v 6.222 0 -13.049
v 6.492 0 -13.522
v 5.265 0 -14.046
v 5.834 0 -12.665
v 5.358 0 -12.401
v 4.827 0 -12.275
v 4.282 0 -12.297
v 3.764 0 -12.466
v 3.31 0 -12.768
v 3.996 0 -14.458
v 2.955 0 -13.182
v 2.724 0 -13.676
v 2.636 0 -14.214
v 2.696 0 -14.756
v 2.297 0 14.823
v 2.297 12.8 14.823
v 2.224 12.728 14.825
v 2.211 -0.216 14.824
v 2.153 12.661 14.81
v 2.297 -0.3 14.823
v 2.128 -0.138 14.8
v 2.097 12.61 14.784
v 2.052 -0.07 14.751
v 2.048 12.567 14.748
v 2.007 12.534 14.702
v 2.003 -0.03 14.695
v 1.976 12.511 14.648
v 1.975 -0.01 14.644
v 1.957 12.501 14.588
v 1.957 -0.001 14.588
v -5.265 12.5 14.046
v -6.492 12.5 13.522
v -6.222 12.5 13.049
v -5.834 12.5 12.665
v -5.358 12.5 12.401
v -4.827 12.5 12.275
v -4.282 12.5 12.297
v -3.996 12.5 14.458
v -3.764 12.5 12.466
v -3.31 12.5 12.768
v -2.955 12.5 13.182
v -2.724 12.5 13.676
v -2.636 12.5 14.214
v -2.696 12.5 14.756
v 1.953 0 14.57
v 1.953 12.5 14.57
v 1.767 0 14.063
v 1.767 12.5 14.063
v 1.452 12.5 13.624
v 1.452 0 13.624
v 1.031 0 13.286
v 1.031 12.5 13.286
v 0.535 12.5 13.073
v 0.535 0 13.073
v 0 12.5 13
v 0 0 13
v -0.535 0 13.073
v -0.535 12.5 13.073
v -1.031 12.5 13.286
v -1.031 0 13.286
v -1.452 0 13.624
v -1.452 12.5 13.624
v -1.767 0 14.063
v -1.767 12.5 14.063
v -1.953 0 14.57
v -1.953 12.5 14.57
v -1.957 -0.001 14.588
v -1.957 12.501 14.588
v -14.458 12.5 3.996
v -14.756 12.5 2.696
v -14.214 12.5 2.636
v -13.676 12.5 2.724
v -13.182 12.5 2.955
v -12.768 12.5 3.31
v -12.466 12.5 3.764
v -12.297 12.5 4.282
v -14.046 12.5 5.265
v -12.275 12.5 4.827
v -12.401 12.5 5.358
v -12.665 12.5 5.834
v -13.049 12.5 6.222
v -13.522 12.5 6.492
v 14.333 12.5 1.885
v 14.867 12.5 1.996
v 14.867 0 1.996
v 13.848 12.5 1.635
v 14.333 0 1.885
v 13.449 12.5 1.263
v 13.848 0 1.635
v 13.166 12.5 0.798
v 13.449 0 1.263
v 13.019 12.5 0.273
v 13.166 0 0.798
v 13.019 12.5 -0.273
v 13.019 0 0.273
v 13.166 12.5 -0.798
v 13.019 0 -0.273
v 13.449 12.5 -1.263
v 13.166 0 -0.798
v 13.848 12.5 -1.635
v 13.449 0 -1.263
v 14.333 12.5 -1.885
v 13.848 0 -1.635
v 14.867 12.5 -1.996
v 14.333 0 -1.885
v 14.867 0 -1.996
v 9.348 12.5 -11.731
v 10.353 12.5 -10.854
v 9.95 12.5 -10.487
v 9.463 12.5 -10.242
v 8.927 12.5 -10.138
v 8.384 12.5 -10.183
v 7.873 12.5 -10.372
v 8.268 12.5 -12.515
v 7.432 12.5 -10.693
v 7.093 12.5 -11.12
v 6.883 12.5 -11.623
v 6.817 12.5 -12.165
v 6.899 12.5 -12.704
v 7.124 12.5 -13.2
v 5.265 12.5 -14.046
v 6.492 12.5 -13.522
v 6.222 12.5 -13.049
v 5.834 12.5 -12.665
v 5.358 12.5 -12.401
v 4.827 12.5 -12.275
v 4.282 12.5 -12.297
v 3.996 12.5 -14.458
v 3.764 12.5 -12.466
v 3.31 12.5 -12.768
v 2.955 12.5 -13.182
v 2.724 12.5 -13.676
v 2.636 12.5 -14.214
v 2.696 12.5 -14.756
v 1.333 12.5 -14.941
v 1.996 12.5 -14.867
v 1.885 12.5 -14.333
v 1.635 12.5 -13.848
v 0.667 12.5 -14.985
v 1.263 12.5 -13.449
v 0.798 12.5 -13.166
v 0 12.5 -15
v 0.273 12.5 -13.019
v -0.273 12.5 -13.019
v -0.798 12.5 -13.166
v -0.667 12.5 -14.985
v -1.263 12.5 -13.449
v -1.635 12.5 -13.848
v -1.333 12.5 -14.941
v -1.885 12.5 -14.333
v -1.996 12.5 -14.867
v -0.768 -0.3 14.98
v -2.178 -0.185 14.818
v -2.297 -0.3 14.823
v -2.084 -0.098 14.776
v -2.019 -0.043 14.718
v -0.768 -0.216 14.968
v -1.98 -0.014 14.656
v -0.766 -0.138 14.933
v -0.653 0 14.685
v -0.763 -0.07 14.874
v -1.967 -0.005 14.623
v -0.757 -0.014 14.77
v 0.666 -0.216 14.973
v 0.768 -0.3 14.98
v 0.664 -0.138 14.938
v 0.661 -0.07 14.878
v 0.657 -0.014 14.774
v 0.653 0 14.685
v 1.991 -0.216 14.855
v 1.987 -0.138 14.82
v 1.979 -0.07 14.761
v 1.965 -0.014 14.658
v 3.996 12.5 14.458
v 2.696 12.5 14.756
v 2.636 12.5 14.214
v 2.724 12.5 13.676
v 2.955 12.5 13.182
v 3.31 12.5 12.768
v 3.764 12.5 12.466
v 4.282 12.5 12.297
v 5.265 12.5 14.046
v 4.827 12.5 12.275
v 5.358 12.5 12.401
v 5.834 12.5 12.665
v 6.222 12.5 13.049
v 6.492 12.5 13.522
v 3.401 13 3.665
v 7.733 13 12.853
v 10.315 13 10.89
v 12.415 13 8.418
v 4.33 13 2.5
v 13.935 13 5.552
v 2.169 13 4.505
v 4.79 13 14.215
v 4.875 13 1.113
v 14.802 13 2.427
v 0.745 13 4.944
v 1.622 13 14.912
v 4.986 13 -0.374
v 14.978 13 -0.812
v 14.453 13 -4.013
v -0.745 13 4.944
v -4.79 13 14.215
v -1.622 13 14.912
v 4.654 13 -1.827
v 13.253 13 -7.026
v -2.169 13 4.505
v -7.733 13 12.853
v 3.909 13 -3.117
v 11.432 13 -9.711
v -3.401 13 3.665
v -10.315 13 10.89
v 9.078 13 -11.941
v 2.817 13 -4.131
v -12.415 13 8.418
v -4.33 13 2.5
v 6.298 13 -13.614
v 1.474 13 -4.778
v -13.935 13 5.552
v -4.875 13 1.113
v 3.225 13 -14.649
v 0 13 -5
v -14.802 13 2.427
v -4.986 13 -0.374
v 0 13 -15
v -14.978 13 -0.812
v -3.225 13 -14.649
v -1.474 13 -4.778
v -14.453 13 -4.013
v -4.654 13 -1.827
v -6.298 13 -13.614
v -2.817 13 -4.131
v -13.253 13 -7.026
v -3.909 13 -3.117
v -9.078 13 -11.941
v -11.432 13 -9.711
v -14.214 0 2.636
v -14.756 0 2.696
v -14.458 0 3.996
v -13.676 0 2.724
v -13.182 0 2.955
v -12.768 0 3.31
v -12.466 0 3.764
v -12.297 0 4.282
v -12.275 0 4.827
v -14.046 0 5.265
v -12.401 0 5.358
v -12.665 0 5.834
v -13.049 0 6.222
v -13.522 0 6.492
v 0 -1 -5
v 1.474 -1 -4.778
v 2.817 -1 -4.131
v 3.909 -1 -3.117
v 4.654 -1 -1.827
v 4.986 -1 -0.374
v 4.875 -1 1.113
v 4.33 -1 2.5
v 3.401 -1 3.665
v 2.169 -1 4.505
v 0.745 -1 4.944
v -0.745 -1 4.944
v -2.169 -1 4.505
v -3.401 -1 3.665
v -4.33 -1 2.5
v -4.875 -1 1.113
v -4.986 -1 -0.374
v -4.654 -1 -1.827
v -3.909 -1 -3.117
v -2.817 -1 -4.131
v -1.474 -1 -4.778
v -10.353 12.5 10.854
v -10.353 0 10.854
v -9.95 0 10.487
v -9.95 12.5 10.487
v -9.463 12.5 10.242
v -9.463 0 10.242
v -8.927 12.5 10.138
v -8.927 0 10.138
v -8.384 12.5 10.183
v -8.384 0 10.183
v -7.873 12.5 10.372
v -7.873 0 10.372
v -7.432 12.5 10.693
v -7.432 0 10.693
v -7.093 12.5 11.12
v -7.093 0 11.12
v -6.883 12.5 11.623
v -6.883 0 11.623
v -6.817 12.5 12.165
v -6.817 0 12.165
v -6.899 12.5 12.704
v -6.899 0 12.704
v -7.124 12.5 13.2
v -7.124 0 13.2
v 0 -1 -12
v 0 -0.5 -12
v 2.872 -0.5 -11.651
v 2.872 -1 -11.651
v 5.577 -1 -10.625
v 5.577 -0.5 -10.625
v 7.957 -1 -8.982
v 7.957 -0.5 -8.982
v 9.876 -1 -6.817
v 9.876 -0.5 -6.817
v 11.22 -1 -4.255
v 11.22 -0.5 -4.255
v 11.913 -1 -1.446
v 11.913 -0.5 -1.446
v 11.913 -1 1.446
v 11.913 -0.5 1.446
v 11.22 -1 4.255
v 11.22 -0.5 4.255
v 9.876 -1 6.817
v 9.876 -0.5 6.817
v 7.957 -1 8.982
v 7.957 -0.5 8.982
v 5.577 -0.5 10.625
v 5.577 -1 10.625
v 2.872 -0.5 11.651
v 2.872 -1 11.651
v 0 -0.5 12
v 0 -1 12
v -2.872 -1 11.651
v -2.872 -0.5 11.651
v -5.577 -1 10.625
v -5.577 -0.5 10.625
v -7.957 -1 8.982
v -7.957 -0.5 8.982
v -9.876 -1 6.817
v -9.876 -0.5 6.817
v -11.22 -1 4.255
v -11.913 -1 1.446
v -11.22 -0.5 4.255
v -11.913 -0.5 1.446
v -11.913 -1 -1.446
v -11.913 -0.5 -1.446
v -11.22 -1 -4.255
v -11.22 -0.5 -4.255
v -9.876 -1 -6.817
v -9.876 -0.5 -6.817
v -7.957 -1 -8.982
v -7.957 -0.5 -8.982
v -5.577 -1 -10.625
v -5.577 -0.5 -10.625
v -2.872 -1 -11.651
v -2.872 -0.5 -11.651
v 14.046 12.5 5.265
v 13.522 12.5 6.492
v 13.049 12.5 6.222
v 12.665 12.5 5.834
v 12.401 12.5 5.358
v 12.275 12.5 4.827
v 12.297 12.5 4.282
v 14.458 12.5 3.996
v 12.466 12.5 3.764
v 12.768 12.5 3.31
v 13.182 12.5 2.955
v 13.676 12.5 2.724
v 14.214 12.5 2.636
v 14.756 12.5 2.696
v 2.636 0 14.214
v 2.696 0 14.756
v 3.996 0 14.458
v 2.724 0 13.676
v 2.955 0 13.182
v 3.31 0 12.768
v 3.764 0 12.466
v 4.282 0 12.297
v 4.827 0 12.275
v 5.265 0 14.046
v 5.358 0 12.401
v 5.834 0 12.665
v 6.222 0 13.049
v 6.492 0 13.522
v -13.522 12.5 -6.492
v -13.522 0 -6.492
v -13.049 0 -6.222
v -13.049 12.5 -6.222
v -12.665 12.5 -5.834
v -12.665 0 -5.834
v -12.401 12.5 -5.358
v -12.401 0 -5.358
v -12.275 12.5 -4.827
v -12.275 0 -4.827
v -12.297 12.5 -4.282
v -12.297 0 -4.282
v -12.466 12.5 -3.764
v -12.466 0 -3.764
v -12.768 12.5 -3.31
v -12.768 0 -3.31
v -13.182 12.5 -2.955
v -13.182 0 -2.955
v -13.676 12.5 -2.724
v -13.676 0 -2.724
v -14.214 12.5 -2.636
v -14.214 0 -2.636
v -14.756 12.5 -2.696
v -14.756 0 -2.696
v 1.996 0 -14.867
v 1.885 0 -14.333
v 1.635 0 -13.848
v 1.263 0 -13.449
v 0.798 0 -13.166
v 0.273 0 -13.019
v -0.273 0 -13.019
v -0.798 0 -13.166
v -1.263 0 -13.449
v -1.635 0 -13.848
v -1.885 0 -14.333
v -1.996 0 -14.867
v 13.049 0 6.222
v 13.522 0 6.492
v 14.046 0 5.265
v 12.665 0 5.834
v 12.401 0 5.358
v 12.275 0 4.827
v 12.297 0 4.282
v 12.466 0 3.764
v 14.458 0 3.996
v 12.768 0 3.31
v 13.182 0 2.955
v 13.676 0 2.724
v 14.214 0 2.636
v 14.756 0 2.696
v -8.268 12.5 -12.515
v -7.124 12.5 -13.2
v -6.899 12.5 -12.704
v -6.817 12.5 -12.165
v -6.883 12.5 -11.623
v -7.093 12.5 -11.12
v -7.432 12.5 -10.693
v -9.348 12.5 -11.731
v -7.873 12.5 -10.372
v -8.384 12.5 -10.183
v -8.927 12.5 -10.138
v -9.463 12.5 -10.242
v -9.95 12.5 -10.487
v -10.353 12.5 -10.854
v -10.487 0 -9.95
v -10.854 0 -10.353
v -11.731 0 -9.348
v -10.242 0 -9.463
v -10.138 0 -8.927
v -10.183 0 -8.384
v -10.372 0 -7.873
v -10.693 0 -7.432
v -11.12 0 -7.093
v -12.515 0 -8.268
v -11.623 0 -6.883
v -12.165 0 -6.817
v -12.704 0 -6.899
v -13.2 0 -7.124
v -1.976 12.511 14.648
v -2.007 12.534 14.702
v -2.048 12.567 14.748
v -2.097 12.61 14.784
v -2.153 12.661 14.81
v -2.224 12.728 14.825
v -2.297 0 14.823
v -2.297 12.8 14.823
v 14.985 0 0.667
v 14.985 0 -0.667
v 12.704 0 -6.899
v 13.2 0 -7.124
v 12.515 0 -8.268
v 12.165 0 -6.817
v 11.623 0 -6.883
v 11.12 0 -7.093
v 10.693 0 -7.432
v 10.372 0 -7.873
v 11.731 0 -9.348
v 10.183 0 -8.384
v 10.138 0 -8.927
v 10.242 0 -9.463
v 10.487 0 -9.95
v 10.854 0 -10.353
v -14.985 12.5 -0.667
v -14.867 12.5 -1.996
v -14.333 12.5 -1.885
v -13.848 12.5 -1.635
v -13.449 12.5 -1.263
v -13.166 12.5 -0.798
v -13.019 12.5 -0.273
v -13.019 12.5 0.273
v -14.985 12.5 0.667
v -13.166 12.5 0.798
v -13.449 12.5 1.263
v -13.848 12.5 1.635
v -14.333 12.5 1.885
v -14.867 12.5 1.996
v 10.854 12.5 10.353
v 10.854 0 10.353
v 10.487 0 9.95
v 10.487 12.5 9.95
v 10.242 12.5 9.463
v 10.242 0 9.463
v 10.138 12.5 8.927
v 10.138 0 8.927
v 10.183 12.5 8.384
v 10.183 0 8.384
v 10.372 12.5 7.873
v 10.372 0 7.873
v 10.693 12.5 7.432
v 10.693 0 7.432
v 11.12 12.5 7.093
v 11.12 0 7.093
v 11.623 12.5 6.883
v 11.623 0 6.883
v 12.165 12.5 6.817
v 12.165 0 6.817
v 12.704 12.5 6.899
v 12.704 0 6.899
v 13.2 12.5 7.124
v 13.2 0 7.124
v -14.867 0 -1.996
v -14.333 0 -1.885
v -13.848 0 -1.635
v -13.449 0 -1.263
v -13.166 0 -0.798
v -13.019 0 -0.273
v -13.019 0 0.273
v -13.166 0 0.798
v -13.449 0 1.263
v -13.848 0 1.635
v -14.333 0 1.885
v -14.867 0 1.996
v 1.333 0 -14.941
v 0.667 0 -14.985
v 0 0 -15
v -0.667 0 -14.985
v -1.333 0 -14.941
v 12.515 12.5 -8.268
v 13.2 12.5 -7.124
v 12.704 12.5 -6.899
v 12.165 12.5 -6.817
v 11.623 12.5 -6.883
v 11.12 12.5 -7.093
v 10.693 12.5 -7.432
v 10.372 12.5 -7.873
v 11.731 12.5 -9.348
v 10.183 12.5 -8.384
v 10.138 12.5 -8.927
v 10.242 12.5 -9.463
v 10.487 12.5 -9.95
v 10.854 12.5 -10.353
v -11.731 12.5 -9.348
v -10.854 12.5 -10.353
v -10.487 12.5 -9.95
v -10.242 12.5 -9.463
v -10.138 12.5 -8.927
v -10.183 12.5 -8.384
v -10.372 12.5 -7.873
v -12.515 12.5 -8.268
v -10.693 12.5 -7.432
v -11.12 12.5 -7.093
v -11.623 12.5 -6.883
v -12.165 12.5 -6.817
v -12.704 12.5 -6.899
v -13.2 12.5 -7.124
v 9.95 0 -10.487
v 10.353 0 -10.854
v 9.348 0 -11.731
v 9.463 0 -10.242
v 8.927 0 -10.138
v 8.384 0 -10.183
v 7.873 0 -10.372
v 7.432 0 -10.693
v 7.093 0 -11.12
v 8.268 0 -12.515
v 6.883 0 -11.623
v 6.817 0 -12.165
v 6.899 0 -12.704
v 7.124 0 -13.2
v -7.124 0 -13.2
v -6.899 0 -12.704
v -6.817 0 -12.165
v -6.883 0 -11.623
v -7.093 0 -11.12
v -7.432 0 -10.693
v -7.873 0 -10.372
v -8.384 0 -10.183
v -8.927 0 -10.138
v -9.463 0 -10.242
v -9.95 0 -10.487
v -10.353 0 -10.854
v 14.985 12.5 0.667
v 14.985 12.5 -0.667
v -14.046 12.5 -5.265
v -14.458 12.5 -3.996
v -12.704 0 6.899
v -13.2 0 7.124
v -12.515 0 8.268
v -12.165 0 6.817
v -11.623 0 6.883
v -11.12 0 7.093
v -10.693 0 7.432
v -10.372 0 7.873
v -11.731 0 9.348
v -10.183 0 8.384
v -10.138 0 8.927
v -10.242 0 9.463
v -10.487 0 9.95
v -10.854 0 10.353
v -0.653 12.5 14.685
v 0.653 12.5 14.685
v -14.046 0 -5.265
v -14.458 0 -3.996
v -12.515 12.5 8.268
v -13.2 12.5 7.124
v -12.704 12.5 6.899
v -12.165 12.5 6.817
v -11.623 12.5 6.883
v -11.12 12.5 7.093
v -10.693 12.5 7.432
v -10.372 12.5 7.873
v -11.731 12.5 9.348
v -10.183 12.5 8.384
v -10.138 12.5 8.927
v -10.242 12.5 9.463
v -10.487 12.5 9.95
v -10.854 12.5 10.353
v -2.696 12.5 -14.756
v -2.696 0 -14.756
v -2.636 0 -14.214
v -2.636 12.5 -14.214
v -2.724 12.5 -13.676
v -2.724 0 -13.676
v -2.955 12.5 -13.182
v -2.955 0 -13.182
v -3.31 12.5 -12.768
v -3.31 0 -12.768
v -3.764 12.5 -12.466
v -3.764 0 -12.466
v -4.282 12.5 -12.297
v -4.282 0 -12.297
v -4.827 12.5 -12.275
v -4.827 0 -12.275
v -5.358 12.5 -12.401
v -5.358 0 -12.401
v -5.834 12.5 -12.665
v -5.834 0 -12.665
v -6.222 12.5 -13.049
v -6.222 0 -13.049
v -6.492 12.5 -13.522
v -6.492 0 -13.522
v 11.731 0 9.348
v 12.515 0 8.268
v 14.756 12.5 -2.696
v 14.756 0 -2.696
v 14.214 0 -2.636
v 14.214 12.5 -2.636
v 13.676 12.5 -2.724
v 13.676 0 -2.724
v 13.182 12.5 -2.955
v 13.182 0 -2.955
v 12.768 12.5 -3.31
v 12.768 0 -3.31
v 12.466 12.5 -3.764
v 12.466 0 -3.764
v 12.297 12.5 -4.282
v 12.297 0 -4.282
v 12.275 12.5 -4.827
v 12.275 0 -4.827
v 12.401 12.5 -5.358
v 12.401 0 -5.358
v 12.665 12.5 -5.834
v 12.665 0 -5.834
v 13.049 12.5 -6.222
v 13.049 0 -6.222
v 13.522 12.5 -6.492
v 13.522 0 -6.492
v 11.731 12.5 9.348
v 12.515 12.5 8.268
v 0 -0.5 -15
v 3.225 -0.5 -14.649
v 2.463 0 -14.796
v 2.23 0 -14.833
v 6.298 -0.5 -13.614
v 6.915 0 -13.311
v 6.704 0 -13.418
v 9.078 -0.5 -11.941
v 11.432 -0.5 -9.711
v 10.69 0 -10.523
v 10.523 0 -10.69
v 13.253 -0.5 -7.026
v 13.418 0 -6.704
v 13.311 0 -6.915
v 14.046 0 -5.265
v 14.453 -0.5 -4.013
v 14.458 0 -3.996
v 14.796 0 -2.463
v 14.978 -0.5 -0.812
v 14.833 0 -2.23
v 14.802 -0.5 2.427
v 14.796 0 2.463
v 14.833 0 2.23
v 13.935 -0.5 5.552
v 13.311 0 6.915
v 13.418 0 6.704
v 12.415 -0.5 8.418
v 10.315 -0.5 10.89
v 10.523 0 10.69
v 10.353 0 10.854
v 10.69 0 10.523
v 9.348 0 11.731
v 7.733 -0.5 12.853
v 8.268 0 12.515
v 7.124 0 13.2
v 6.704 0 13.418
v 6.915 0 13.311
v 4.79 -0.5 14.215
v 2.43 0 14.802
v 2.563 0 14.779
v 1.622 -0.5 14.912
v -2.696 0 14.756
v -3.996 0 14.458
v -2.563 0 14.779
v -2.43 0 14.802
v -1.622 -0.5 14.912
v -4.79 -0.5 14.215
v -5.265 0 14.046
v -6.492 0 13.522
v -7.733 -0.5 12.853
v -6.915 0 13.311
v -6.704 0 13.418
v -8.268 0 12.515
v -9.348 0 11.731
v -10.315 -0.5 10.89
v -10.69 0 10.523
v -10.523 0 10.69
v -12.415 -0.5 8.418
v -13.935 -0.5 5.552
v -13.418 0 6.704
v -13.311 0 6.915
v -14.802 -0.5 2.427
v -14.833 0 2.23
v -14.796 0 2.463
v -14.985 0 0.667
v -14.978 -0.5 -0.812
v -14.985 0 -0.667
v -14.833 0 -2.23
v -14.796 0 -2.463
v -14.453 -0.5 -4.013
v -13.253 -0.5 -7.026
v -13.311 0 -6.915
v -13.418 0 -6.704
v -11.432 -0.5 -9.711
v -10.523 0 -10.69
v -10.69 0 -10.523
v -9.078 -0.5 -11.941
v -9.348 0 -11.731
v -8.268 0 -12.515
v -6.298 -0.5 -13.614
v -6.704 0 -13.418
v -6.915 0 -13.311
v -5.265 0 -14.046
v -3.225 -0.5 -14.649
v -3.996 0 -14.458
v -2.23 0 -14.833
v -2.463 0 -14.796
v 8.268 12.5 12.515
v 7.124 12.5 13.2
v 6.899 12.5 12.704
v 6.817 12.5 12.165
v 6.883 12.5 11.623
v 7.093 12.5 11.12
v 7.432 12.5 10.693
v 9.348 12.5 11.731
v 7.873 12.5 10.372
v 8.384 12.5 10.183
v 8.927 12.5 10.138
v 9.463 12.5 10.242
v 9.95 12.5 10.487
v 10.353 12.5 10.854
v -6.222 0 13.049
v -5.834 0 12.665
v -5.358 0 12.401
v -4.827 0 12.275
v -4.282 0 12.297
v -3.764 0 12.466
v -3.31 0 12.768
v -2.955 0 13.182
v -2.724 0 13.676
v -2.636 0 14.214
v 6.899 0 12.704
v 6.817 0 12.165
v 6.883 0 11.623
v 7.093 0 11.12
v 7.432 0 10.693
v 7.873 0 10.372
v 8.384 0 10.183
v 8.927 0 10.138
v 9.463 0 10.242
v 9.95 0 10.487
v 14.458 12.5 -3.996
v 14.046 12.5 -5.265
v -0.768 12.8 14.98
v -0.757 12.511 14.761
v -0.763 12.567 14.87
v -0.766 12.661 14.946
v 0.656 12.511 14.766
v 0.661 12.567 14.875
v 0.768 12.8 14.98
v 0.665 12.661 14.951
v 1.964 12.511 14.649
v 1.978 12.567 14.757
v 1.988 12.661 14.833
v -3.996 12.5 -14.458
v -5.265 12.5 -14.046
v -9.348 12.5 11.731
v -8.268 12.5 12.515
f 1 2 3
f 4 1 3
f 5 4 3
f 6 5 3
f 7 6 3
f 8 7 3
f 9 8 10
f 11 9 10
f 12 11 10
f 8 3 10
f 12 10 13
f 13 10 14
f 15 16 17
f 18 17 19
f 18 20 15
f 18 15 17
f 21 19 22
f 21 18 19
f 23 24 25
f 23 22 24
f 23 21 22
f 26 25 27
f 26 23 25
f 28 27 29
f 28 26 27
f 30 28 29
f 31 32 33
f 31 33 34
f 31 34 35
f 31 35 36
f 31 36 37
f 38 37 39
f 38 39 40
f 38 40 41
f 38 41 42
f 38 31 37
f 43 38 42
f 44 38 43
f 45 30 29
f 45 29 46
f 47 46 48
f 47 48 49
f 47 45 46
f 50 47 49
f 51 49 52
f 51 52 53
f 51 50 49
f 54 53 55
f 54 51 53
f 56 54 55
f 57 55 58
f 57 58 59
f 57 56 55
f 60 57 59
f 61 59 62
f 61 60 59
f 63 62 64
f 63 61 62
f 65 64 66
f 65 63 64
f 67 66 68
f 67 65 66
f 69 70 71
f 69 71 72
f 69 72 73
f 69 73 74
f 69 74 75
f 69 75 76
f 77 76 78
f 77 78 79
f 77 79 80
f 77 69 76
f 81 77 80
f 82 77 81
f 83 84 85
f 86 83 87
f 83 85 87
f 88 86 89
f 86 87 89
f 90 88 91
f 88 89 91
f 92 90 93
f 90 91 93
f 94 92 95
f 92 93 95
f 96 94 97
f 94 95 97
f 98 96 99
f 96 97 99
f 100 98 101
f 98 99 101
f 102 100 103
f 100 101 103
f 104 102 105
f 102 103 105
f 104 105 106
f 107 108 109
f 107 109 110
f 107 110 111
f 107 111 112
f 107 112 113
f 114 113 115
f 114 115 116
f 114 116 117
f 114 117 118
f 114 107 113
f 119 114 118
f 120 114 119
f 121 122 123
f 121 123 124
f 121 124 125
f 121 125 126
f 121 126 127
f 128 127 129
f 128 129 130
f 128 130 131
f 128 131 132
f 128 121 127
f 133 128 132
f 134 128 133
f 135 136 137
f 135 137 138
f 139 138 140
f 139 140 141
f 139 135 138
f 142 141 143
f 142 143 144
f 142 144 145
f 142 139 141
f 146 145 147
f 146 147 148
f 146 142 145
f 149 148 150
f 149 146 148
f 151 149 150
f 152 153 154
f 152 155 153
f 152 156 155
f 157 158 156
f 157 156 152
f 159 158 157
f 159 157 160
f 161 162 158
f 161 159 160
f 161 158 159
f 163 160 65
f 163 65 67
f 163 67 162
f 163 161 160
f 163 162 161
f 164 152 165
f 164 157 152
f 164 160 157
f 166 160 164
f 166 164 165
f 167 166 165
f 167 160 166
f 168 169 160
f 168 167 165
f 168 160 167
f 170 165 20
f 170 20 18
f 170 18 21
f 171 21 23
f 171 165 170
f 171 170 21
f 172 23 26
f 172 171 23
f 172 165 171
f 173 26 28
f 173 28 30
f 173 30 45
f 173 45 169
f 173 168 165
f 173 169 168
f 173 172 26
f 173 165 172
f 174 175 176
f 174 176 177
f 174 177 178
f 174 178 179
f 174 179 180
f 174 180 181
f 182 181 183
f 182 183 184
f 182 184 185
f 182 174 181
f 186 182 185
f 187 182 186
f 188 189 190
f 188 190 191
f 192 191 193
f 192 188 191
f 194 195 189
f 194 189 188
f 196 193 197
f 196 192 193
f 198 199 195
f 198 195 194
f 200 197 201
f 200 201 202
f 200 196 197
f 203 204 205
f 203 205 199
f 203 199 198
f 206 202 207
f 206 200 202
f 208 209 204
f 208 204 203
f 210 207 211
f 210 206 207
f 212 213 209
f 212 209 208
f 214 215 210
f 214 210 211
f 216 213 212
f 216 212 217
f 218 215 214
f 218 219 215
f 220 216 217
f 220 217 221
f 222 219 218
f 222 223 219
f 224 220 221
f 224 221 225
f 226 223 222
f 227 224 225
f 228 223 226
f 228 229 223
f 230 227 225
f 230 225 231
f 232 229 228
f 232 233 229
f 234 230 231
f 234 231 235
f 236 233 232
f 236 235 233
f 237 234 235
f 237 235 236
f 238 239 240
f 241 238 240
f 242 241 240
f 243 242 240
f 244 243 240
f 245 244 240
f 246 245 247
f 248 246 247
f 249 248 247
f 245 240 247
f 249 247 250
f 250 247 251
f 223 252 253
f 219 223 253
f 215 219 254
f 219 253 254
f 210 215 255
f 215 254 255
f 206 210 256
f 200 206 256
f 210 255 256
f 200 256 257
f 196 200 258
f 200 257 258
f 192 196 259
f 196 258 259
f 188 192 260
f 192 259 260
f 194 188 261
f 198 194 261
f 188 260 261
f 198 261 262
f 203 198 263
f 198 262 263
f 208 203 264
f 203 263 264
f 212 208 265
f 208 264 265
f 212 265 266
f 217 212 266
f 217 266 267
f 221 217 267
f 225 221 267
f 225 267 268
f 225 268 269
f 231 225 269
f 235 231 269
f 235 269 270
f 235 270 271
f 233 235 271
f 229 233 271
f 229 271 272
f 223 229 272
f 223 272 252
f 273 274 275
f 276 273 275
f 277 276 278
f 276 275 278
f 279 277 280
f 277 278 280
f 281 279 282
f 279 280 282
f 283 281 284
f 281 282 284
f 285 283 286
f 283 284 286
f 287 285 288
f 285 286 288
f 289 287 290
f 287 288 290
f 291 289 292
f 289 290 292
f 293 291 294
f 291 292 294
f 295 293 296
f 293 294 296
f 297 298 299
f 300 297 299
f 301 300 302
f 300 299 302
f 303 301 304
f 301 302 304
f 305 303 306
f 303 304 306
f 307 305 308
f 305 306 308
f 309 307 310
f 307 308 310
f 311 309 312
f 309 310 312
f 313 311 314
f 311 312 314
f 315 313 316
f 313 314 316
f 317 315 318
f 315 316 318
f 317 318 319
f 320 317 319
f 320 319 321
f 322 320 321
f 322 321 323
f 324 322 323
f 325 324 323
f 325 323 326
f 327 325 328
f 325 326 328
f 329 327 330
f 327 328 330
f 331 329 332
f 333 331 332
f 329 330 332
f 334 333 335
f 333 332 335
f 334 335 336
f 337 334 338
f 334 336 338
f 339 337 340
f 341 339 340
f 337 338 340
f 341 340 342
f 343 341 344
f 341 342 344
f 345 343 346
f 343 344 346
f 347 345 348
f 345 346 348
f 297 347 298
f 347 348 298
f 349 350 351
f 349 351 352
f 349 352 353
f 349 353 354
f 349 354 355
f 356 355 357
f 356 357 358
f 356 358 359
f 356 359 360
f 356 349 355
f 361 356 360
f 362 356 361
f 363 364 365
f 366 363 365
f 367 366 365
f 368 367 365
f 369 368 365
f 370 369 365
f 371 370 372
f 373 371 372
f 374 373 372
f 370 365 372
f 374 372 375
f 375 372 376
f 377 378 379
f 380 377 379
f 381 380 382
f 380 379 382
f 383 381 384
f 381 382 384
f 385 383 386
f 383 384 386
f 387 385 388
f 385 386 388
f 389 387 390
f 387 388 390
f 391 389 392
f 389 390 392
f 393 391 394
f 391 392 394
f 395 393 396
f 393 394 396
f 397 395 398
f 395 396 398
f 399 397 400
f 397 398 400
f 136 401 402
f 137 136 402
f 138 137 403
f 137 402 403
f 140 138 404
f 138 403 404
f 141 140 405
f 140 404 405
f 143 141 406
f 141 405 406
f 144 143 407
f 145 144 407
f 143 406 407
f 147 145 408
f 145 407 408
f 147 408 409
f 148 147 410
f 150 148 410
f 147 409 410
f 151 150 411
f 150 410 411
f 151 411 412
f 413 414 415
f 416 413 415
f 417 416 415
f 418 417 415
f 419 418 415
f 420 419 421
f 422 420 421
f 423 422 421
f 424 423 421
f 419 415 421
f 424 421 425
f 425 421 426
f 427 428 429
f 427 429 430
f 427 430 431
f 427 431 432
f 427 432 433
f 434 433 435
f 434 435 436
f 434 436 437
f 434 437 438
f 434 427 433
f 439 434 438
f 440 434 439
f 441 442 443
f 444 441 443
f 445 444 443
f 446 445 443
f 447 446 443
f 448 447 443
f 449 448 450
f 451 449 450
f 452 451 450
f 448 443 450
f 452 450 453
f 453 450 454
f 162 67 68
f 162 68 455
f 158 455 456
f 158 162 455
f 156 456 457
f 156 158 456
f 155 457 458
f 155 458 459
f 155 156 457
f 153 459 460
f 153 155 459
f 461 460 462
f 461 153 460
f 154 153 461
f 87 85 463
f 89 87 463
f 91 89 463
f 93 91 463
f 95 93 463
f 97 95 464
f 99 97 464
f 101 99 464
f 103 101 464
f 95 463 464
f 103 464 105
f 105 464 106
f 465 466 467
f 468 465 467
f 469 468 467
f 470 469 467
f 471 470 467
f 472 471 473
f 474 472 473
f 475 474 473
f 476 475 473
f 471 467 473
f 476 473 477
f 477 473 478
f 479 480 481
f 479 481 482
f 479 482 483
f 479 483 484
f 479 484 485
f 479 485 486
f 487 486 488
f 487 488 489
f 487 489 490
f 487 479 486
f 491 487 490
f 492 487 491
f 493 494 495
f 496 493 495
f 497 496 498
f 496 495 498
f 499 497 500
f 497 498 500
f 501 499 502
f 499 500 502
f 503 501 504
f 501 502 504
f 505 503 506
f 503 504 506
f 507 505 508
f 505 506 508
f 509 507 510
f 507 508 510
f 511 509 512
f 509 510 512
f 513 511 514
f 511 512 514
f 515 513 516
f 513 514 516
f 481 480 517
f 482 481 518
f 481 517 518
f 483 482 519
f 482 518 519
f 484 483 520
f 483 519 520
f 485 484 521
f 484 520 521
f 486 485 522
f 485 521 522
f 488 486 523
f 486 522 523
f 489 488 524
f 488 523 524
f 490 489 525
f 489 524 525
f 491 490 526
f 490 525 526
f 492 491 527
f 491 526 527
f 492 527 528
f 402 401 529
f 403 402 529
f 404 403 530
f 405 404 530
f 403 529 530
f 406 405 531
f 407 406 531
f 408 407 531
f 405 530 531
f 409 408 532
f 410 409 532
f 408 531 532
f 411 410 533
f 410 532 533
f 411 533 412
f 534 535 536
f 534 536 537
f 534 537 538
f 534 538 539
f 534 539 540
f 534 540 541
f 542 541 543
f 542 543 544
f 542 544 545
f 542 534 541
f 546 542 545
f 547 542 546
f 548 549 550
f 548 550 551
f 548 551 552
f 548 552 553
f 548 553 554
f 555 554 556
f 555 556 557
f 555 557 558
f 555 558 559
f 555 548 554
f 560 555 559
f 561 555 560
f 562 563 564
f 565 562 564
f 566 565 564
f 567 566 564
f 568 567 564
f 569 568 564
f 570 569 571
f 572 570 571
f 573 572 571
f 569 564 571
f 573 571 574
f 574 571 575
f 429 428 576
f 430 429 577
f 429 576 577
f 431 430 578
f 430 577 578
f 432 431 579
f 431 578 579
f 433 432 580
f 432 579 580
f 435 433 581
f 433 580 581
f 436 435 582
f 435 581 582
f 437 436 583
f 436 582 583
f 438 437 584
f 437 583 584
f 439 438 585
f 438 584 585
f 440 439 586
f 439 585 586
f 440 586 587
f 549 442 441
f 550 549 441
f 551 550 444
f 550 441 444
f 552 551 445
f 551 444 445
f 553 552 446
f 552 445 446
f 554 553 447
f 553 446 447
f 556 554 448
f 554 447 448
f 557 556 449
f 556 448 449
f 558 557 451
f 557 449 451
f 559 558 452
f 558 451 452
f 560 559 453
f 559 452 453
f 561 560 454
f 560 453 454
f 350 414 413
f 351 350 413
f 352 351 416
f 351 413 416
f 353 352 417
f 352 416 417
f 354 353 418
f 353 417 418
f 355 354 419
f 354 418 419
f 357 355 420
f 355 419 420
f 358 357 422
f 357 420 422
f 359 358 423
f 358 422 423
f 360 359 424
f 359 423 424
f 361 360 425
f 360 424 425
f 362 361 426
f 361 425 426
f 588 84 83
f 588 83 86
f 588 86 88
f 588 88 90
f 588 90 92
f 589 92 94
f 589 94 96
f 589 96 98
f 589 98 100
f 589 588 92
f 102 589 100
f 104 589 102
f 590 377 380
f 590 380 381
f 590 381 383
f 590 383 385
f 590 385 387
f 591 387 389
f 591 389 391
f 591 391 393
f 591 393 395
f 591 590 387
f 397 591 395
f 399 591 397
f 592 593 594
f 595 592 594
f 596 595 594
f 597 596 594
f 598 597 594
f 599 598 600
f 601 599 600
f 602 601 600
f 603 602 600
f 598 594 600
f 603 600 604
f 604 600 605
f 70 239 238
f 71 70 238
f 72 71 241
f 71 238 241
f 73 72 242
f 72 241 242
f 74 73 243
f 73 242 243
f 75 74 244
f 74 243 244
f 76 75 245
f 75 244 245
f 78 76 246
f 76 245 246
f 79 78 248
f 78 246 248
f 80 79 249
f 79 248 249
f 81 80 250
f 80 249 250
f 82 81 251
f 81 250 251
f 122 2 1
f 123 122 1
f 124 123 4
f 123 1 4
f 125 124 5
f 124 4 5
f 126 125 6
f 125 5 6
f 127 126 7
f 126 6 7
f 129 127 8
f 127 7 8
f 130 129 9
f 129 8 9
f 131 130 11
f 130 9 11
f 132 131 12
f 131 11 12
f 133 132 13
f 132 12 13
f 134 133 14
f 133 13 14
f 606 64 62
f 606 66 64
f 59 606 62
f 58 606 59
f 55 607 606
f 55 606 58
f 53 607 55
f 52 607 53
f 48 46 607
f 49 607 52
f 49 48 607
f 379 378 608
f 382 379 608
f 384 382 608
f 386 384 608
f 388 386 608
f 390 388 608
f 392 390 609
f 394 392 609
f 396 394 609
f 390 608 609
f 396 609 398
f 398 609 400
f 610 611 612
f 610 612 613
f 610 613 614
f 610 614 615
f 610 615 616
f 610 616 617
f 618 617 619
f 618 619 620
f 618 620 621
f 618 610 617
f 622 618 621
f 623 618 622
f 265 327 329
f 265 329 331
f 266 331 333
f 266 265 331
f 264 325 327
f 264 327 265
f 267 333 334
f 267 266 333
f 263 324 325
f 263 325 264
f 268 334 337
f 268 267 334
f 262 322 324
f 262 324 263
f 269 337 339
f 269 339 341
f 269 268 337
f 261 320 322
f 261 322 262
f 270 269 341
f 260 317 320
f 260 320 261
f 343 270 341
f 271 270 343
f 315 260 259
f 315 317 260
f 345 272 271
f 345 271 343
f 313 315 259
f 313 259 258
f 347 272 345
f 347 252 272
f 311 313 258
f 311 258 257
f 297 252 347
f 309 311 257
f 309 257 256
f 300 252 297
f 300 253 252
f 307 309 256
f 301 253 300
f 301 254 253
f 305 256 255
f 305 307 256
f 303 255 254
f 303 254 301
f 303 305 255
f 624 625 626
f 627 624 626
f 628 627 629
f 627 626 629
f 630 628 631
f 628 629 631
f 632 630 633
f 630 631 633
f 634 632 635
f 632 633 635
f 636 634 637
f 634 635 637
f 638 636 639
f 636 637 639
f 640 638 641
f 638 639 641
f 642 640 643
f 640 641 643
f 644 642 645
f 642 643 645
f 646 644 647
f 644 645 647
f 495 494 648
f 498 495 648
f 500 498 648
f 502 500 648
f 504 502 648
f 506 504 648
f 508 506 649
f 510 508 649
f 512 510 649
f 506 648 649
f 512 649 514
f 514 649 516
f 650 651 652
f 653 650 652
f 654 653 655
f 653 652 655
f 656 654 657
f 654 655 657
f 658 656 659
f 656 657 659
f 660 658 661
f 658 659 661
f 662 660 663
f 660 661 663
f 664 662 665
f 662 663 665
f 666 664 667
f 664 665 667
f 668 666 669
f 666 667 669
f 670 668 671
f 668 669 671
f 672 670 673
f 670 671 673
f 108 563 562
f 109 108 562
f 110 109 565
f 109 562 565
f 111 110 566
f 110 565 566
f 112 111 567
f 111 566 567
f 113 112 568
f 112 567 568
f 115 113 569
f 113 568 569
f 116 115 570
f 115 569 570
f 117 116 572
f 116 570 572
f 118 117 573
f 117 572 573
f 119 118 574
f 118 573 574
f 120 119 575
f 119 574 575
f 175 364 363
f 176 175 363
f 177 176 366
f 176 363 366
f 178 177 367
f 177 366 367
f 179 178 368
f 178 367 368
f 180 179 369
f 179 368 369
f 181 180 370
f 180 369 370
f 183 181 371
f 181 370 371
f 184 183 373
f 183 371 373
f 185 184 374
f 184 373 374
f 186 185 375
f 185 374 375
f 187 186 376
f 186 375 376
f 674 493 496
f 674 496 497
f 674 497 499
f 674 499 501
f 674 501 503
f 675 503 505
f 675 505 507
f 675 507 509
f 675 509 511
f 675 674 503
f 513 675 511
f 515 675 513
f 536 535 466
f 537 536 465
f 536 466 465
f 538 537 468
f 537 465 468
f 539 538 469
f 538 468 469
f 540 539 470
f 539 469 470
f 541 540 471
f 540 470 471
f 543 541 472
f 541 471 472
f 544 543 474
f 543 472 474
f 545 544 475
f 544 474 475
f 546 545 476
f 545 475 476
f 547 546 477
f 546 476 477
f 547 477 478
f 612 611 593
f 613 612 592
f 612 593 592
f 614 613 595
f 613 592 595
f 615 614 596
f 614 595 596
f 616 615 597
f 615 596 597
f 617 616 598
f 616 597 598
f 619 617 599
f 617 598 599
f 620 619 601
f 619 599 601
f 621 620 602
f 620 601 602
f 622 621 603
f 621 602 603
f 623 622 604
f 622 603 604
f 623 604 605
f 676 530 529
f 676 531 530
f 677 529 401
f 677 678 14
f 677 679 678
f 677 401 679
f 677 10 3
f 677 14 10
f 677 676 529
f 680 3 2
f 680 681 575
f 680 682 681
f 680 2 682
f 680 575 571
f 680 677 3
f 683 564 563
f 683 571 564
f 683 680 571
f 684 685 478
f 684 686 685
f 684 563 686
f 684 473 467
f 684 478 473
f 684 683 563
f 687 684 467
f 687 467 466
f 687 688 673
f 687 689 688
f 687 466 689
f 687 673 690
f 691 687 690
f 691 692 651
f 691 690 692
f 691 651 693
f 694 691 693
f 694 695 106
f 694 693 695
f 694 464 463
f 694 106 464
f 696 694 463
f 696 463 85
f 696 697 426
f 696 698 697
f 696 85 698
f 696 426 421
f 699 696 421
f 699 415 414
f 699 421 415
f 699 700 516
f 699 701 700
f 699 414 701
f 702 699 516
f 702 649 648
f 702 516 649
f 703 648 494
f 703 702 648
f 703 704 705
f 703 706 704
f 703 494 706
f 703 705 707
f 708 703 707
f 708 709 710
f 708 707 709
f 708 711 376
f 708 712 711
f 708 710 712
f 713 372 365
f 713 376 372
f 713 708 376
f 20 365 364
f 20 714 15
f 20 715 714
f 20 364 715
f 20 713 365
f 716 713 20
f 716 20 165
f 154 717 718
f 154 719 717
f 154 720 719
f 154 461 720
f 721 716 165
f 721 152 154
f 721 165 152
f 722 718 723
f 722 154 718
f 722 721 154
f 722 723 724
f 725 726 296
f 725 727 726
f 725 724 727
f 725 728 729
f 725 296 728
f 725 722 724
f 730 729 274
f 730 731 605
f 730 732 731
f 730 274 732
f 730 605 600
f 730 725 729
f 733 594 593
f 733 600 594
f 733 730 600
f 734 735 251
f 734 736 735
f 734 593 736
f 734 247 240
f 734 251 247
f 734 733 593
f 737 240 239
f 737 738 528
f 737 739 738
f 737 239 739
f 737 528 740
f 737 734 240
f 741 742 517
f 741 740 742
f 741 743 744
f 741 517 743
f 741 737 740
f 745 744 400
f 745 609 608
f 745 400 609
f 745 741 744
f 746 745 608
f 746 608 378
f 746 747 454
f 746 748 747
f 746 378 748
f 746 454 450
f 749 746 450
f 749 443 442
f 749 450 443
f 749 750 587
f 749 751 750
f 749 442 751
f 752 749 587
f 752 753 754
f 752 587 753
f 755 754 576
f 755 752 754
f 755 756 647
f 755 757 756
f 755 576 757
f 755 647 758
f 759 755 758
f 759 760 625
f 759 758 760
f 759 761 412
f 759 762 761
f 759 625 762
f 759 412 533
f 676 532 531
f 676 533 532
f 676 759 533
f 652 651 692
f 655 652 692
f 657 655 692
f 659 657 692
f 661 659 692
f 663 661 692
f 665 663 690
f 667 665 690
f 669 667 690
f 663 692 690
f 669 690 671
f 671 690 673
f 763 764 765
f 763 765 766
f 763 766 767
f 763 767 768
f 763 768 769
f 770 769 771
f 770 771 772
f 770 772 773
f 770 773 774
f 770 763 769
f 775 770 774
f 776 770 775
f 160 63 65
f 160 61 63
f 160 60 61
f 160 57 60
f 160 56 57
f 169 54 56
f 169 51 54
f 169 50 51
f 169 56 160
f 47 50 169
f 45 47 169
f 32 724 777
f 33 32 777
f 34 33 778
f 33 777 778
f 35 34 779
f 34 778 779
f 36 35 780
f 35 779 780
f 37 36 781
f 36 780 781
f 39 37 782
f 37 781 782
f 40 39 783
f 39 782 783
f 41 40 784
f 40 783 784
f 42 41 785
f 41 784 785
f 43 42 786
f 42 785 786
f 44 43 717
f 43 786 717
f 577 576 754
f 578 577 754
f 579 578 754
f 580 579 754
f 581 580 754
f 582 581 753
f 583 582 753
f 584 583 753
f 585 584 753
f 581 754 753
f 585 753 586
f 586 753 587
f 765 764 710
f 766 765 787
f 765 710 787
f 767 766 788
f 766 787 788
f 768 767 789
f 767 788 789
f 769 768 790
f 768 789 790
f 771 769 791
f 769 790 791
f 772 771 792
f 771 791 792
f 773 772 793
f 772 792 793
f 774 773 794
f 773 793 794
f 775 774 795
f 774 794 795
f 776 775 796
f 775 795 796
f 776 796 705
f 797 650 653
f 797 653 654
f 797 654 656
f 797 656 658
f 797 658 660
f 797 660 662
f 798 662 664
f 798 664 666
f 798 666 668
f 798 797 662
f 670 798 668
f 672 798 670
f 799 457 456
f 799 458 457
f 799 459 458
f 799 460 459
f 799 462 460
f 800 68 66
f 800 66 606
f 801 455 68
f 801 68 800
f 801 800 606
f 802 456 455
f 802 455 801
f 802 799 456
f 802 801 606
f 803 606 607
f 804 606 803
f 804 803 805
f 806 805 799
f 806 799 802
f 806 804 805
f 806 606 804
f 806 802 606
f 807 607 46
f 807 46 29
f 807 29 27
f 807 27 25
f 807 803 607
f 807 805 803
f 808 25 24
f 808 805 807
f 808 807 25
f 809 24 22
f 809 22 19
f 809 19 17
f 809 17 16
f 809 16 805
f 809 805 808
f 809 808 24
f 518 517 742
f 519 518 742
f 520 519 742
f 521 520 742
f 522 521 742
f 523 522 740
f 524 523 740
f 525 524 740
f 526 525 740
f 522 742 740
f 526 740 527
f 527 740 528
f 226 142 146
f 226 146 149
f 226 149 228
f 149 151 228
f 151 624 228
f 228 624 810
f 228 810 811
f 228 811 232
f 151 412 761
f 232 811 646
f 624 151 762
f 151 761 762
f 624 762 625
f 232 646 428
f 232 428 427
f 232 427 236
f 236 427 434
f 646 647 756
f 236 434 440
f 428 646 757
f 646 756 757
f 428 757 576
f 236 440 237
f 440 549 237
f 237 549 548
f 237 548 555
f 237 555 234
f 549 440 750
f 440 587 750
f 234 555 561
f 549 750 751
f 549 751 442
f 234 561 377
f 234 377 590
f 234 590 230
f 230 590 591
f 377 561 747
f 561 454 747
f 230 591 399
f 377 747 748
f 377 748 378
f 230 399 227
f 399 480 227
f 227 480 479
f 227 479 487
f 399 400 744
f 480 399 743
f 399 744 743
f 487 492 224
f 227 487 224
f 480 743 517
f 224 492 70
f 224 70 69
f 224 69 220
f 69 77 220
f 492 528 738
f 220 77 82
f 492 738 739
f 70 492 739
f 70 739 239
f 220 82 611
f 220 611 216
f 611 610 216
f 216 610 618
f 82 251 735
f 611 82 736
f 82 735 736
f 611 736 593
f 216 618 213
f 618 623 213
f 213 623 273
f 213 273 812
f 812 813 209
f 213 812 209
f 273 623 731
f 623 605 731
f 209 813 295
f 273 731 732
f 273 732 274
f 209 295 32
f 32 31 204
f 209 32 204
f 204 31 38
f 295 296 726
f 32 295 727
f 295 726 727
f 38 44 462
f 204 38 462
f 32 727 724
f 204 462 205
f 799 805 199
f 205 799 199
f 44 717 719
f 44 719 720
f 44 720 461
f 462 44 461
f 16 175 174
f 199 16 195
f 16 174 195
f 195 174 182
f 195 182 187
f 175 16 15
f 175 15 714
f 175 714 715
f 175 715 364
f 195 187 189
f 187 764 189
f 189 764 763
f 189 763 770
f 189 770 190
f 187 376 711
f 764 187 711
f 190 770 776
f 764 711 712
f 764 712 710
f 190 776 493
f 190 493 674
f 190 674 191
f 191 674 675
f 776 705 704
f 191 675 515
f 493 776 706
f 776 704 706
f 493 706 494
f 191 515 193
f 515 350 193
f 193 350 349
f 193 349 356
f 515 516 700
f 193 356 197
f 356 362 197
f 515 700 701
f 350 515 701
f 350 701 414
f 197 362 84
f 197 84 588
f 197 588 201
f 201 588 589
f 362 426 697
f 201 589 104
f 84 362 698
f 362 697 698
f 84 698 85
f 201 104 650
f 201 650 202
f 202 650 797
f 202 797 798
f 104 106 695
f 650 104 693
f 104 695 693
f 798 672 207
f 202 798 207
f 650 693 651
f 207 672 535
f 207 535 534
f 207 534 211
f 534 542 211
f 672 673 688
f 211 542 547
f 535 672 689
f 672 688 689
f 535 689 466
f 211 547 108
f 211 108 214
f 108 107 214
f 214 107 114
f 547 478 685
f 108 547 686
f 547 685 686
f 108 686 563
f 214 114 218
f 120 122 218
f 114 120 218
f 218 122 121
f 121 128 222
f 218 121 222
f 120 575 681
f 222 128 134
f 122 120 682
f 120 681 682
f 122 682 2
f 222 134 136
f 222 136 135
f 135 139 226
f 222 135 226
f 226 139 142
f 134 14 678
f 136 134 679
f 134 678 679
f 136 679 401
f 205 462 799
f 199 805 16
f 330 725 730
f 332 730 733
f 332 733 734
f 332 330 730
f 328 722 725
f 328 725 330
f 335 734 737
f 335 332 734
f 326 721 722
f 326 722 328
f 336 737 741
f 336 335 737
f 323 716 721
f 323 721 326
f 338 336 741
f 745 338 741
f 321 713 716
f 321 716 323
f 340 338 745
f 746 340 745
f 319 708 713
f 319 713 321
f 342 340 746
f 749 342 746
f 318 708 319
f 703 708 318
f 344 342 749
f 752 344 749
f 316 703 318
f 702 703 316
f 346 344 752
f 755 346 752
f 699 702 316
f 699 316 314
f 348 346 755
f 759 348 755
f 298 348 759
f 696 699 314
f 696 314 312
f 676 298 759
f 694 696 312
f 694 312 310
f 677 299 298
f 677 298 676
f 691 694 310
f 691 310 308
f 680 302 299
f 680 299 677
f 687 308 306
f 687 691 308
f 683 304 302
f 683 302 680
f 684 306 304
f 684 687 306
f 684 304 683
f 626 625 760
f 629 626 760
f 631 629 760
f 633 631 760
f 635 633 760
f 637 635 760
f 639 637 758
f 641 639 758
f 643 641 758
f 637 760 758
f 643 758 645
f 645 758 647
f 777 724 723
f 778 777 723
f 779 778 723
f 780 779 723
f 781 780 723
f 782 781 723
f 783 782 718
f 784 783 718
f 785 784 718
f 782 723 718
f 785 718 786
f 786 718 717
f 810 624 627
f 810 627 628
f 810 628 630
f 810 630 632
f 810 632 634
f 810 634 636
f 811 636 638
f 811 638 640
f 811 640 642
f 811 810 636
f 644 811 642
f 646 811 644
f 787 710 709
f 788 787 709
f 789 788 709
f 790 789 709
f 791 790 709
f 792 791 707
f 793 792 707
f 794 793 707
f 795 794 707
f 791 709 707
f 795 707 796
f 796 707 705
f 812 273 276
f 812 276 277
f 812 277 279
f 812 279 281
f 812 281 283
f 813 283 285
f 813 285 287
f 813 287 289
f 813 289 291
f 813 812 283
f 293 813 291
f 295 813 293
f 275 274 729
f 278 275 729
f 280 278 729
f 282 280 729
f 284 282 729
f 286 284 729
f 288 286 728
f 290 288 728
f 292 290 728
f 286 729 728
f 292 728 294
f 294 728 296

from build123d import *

# Parameters (mm, degrees)
SKETCH_2_R               = 15
EXTRUDE_1_DEPTH          = 13
SKETCH_8_R               = 2
CUT_EXTRUDE_10_DEPTH     = 12.5
EXTRUDE_START            = 0.5
SKETCH_10_R              = 15
EXTRUDE_4_DEPTH          = 0.5
SKETCH_11_R              = 12
EXTRUDE_5_DEPTH          = 0.5
SKETCH_12_R              = 5
CUT_EXTRUDE_12_DEPTH     = 26.416530054
FILLET_START             = -0.3000001
FILLET_2_DEPTH           = 13.1000002
FILLET_2_2_ANGLE         = 17.614798
PATTERN_CIRCULAR_1_COUNT = 20


with BuildPart() as part:
    # 草图2 → 凸台-拉伸1 (new body)
    with BuildSketch(Plane(origin=(0, 0, 0), x_dir=(1, 0, 0), z_dir=(0, 1, 0))):
        with Locations(Location((0, 0, 0), (0, 0, 90))):
            Circle(SKETCH_2_R)
    extrude(amount=EXTRUDE_1_DEPTH)

    # 草图8 → 切除-拉伸10 (cut)
    with BuildSketch(Plane.XZ):
        with Locations((0, 15)):
            Circle(SKETCH_8_R)
    cut_extrude_10 = extrude(amount=-CUT_EXTRUDE_10_DEPTH, mode=Mode.SUBTRACT)

    # 草图10 → 凸台-拉伸4 (add)
    with BuildSketch(Plane.XZ.offset(EXTRUDE_START)):
        with Locations(Location((0, 0, 0), (0, 0, 270))):
            Circle(SKETCH_10_R)
    extrude(amount=-EXTRUDE_4_DEPTH)

    # 草图11 → 凸台-拉伸5 (add)
    with BuildSketch(Plane.XZ.offset(0.5)):
        with Locations(Location((0, 0, 0), (0, 0, 270))):
            Circle(SKETCH_11_R)
    extrude(amount=EXTRUDE_5_DEPTH)

    # 草图12 → 切除-拉伸12 (cut, through all)
    with BuildSketch(Plane.XZ.offset(1)):
        with Locations(Location((0, 0, 0), (0, 0, 270))):
            Circle(SKETCH_12_R)
    extrude(amount=-CUT_EXTRUDE_12_DEPTH, mode=Mode.SUBTRACT)

    # 圆角2: read off the stored shape, not the designer's step
    # 圆角2 outline → 圆角2 (cut)
    with BuildSketch(Plane(origin=(0, 0, 0), x_dir=(1, 0, 0), z_dir=(0, 1, 0)).offset(FILLET_START)):
        with BuildLine():
            ThreePointArc((2.296701806, -14.823129252), (2.080163818, -14.773434354), (1.957189365, -14.588405797))
            ThreePointArc((1.957189365, -14.588405797), (0, -13), (-1.957189365, -14.588405797))
            ThreePointArc((-1.957189365, -14.588405797), (-2.080163818, -14.773434354), (-2.296701806, -14.823129252))
            ThreePointArc((-2.296701806, -14.823129252), (0, -15), (2.296701806, -14.823129252))
        make_face()
    extrude(amount=FILLET_2_DEPTH, mode=Mode.SUBTRACT)

    # Fillet 2 2 outline → Fillet 2 2 (revolve)
    with BuildSketch(Plane(origin=(0, 0, 0), x_dir=(-0.1531134537578896, 0, 0.9882086167800453), z_dir=(-0.9882086167800453, 0, -0.1531134537578896))):
        with BuildLine():
            Line((13, 12.8000001), (13, 12.5))
            Line((13, 12.5), (14.7, 12.5))
            ThreePointArc((14.7, 12.5), (14.912132034, 12.587867966), (15, 12.8))
            Line((15, 12.8), (13, 12.8000001))
        make_face()
        with BuildLine():
            Line((14.7, 0), (13, 0))
            Line((13, 0), (13, -0.3000001))
            Line((13, -0.3000001), (15, -0.3))
            ThreePointArc((15, -0.3), (14.912132034, -0.087867966), (14.7, 0))
        make_face()
    revolve(axis=Axis((0, 0, 0), (0, 1, 0)), revolution_arc=FILLET_2_2_ANGLE)

    # 阵列(圆周)1: 切除-拉伸10 ×20 about axis
    pattern_circular_1_axis = Axis((0, 0, 0), (0, 1, 0))
    for i in range(1, PATTERN_CIRCULAR_1_COUNT):
        add(cut_extrude_10.rotate(pattern_circular_1_axis, i * 360 / PATTERN_CIRCULAR_1_COUNT), mode=Mode.SUBTRACT)


solid = part.part
